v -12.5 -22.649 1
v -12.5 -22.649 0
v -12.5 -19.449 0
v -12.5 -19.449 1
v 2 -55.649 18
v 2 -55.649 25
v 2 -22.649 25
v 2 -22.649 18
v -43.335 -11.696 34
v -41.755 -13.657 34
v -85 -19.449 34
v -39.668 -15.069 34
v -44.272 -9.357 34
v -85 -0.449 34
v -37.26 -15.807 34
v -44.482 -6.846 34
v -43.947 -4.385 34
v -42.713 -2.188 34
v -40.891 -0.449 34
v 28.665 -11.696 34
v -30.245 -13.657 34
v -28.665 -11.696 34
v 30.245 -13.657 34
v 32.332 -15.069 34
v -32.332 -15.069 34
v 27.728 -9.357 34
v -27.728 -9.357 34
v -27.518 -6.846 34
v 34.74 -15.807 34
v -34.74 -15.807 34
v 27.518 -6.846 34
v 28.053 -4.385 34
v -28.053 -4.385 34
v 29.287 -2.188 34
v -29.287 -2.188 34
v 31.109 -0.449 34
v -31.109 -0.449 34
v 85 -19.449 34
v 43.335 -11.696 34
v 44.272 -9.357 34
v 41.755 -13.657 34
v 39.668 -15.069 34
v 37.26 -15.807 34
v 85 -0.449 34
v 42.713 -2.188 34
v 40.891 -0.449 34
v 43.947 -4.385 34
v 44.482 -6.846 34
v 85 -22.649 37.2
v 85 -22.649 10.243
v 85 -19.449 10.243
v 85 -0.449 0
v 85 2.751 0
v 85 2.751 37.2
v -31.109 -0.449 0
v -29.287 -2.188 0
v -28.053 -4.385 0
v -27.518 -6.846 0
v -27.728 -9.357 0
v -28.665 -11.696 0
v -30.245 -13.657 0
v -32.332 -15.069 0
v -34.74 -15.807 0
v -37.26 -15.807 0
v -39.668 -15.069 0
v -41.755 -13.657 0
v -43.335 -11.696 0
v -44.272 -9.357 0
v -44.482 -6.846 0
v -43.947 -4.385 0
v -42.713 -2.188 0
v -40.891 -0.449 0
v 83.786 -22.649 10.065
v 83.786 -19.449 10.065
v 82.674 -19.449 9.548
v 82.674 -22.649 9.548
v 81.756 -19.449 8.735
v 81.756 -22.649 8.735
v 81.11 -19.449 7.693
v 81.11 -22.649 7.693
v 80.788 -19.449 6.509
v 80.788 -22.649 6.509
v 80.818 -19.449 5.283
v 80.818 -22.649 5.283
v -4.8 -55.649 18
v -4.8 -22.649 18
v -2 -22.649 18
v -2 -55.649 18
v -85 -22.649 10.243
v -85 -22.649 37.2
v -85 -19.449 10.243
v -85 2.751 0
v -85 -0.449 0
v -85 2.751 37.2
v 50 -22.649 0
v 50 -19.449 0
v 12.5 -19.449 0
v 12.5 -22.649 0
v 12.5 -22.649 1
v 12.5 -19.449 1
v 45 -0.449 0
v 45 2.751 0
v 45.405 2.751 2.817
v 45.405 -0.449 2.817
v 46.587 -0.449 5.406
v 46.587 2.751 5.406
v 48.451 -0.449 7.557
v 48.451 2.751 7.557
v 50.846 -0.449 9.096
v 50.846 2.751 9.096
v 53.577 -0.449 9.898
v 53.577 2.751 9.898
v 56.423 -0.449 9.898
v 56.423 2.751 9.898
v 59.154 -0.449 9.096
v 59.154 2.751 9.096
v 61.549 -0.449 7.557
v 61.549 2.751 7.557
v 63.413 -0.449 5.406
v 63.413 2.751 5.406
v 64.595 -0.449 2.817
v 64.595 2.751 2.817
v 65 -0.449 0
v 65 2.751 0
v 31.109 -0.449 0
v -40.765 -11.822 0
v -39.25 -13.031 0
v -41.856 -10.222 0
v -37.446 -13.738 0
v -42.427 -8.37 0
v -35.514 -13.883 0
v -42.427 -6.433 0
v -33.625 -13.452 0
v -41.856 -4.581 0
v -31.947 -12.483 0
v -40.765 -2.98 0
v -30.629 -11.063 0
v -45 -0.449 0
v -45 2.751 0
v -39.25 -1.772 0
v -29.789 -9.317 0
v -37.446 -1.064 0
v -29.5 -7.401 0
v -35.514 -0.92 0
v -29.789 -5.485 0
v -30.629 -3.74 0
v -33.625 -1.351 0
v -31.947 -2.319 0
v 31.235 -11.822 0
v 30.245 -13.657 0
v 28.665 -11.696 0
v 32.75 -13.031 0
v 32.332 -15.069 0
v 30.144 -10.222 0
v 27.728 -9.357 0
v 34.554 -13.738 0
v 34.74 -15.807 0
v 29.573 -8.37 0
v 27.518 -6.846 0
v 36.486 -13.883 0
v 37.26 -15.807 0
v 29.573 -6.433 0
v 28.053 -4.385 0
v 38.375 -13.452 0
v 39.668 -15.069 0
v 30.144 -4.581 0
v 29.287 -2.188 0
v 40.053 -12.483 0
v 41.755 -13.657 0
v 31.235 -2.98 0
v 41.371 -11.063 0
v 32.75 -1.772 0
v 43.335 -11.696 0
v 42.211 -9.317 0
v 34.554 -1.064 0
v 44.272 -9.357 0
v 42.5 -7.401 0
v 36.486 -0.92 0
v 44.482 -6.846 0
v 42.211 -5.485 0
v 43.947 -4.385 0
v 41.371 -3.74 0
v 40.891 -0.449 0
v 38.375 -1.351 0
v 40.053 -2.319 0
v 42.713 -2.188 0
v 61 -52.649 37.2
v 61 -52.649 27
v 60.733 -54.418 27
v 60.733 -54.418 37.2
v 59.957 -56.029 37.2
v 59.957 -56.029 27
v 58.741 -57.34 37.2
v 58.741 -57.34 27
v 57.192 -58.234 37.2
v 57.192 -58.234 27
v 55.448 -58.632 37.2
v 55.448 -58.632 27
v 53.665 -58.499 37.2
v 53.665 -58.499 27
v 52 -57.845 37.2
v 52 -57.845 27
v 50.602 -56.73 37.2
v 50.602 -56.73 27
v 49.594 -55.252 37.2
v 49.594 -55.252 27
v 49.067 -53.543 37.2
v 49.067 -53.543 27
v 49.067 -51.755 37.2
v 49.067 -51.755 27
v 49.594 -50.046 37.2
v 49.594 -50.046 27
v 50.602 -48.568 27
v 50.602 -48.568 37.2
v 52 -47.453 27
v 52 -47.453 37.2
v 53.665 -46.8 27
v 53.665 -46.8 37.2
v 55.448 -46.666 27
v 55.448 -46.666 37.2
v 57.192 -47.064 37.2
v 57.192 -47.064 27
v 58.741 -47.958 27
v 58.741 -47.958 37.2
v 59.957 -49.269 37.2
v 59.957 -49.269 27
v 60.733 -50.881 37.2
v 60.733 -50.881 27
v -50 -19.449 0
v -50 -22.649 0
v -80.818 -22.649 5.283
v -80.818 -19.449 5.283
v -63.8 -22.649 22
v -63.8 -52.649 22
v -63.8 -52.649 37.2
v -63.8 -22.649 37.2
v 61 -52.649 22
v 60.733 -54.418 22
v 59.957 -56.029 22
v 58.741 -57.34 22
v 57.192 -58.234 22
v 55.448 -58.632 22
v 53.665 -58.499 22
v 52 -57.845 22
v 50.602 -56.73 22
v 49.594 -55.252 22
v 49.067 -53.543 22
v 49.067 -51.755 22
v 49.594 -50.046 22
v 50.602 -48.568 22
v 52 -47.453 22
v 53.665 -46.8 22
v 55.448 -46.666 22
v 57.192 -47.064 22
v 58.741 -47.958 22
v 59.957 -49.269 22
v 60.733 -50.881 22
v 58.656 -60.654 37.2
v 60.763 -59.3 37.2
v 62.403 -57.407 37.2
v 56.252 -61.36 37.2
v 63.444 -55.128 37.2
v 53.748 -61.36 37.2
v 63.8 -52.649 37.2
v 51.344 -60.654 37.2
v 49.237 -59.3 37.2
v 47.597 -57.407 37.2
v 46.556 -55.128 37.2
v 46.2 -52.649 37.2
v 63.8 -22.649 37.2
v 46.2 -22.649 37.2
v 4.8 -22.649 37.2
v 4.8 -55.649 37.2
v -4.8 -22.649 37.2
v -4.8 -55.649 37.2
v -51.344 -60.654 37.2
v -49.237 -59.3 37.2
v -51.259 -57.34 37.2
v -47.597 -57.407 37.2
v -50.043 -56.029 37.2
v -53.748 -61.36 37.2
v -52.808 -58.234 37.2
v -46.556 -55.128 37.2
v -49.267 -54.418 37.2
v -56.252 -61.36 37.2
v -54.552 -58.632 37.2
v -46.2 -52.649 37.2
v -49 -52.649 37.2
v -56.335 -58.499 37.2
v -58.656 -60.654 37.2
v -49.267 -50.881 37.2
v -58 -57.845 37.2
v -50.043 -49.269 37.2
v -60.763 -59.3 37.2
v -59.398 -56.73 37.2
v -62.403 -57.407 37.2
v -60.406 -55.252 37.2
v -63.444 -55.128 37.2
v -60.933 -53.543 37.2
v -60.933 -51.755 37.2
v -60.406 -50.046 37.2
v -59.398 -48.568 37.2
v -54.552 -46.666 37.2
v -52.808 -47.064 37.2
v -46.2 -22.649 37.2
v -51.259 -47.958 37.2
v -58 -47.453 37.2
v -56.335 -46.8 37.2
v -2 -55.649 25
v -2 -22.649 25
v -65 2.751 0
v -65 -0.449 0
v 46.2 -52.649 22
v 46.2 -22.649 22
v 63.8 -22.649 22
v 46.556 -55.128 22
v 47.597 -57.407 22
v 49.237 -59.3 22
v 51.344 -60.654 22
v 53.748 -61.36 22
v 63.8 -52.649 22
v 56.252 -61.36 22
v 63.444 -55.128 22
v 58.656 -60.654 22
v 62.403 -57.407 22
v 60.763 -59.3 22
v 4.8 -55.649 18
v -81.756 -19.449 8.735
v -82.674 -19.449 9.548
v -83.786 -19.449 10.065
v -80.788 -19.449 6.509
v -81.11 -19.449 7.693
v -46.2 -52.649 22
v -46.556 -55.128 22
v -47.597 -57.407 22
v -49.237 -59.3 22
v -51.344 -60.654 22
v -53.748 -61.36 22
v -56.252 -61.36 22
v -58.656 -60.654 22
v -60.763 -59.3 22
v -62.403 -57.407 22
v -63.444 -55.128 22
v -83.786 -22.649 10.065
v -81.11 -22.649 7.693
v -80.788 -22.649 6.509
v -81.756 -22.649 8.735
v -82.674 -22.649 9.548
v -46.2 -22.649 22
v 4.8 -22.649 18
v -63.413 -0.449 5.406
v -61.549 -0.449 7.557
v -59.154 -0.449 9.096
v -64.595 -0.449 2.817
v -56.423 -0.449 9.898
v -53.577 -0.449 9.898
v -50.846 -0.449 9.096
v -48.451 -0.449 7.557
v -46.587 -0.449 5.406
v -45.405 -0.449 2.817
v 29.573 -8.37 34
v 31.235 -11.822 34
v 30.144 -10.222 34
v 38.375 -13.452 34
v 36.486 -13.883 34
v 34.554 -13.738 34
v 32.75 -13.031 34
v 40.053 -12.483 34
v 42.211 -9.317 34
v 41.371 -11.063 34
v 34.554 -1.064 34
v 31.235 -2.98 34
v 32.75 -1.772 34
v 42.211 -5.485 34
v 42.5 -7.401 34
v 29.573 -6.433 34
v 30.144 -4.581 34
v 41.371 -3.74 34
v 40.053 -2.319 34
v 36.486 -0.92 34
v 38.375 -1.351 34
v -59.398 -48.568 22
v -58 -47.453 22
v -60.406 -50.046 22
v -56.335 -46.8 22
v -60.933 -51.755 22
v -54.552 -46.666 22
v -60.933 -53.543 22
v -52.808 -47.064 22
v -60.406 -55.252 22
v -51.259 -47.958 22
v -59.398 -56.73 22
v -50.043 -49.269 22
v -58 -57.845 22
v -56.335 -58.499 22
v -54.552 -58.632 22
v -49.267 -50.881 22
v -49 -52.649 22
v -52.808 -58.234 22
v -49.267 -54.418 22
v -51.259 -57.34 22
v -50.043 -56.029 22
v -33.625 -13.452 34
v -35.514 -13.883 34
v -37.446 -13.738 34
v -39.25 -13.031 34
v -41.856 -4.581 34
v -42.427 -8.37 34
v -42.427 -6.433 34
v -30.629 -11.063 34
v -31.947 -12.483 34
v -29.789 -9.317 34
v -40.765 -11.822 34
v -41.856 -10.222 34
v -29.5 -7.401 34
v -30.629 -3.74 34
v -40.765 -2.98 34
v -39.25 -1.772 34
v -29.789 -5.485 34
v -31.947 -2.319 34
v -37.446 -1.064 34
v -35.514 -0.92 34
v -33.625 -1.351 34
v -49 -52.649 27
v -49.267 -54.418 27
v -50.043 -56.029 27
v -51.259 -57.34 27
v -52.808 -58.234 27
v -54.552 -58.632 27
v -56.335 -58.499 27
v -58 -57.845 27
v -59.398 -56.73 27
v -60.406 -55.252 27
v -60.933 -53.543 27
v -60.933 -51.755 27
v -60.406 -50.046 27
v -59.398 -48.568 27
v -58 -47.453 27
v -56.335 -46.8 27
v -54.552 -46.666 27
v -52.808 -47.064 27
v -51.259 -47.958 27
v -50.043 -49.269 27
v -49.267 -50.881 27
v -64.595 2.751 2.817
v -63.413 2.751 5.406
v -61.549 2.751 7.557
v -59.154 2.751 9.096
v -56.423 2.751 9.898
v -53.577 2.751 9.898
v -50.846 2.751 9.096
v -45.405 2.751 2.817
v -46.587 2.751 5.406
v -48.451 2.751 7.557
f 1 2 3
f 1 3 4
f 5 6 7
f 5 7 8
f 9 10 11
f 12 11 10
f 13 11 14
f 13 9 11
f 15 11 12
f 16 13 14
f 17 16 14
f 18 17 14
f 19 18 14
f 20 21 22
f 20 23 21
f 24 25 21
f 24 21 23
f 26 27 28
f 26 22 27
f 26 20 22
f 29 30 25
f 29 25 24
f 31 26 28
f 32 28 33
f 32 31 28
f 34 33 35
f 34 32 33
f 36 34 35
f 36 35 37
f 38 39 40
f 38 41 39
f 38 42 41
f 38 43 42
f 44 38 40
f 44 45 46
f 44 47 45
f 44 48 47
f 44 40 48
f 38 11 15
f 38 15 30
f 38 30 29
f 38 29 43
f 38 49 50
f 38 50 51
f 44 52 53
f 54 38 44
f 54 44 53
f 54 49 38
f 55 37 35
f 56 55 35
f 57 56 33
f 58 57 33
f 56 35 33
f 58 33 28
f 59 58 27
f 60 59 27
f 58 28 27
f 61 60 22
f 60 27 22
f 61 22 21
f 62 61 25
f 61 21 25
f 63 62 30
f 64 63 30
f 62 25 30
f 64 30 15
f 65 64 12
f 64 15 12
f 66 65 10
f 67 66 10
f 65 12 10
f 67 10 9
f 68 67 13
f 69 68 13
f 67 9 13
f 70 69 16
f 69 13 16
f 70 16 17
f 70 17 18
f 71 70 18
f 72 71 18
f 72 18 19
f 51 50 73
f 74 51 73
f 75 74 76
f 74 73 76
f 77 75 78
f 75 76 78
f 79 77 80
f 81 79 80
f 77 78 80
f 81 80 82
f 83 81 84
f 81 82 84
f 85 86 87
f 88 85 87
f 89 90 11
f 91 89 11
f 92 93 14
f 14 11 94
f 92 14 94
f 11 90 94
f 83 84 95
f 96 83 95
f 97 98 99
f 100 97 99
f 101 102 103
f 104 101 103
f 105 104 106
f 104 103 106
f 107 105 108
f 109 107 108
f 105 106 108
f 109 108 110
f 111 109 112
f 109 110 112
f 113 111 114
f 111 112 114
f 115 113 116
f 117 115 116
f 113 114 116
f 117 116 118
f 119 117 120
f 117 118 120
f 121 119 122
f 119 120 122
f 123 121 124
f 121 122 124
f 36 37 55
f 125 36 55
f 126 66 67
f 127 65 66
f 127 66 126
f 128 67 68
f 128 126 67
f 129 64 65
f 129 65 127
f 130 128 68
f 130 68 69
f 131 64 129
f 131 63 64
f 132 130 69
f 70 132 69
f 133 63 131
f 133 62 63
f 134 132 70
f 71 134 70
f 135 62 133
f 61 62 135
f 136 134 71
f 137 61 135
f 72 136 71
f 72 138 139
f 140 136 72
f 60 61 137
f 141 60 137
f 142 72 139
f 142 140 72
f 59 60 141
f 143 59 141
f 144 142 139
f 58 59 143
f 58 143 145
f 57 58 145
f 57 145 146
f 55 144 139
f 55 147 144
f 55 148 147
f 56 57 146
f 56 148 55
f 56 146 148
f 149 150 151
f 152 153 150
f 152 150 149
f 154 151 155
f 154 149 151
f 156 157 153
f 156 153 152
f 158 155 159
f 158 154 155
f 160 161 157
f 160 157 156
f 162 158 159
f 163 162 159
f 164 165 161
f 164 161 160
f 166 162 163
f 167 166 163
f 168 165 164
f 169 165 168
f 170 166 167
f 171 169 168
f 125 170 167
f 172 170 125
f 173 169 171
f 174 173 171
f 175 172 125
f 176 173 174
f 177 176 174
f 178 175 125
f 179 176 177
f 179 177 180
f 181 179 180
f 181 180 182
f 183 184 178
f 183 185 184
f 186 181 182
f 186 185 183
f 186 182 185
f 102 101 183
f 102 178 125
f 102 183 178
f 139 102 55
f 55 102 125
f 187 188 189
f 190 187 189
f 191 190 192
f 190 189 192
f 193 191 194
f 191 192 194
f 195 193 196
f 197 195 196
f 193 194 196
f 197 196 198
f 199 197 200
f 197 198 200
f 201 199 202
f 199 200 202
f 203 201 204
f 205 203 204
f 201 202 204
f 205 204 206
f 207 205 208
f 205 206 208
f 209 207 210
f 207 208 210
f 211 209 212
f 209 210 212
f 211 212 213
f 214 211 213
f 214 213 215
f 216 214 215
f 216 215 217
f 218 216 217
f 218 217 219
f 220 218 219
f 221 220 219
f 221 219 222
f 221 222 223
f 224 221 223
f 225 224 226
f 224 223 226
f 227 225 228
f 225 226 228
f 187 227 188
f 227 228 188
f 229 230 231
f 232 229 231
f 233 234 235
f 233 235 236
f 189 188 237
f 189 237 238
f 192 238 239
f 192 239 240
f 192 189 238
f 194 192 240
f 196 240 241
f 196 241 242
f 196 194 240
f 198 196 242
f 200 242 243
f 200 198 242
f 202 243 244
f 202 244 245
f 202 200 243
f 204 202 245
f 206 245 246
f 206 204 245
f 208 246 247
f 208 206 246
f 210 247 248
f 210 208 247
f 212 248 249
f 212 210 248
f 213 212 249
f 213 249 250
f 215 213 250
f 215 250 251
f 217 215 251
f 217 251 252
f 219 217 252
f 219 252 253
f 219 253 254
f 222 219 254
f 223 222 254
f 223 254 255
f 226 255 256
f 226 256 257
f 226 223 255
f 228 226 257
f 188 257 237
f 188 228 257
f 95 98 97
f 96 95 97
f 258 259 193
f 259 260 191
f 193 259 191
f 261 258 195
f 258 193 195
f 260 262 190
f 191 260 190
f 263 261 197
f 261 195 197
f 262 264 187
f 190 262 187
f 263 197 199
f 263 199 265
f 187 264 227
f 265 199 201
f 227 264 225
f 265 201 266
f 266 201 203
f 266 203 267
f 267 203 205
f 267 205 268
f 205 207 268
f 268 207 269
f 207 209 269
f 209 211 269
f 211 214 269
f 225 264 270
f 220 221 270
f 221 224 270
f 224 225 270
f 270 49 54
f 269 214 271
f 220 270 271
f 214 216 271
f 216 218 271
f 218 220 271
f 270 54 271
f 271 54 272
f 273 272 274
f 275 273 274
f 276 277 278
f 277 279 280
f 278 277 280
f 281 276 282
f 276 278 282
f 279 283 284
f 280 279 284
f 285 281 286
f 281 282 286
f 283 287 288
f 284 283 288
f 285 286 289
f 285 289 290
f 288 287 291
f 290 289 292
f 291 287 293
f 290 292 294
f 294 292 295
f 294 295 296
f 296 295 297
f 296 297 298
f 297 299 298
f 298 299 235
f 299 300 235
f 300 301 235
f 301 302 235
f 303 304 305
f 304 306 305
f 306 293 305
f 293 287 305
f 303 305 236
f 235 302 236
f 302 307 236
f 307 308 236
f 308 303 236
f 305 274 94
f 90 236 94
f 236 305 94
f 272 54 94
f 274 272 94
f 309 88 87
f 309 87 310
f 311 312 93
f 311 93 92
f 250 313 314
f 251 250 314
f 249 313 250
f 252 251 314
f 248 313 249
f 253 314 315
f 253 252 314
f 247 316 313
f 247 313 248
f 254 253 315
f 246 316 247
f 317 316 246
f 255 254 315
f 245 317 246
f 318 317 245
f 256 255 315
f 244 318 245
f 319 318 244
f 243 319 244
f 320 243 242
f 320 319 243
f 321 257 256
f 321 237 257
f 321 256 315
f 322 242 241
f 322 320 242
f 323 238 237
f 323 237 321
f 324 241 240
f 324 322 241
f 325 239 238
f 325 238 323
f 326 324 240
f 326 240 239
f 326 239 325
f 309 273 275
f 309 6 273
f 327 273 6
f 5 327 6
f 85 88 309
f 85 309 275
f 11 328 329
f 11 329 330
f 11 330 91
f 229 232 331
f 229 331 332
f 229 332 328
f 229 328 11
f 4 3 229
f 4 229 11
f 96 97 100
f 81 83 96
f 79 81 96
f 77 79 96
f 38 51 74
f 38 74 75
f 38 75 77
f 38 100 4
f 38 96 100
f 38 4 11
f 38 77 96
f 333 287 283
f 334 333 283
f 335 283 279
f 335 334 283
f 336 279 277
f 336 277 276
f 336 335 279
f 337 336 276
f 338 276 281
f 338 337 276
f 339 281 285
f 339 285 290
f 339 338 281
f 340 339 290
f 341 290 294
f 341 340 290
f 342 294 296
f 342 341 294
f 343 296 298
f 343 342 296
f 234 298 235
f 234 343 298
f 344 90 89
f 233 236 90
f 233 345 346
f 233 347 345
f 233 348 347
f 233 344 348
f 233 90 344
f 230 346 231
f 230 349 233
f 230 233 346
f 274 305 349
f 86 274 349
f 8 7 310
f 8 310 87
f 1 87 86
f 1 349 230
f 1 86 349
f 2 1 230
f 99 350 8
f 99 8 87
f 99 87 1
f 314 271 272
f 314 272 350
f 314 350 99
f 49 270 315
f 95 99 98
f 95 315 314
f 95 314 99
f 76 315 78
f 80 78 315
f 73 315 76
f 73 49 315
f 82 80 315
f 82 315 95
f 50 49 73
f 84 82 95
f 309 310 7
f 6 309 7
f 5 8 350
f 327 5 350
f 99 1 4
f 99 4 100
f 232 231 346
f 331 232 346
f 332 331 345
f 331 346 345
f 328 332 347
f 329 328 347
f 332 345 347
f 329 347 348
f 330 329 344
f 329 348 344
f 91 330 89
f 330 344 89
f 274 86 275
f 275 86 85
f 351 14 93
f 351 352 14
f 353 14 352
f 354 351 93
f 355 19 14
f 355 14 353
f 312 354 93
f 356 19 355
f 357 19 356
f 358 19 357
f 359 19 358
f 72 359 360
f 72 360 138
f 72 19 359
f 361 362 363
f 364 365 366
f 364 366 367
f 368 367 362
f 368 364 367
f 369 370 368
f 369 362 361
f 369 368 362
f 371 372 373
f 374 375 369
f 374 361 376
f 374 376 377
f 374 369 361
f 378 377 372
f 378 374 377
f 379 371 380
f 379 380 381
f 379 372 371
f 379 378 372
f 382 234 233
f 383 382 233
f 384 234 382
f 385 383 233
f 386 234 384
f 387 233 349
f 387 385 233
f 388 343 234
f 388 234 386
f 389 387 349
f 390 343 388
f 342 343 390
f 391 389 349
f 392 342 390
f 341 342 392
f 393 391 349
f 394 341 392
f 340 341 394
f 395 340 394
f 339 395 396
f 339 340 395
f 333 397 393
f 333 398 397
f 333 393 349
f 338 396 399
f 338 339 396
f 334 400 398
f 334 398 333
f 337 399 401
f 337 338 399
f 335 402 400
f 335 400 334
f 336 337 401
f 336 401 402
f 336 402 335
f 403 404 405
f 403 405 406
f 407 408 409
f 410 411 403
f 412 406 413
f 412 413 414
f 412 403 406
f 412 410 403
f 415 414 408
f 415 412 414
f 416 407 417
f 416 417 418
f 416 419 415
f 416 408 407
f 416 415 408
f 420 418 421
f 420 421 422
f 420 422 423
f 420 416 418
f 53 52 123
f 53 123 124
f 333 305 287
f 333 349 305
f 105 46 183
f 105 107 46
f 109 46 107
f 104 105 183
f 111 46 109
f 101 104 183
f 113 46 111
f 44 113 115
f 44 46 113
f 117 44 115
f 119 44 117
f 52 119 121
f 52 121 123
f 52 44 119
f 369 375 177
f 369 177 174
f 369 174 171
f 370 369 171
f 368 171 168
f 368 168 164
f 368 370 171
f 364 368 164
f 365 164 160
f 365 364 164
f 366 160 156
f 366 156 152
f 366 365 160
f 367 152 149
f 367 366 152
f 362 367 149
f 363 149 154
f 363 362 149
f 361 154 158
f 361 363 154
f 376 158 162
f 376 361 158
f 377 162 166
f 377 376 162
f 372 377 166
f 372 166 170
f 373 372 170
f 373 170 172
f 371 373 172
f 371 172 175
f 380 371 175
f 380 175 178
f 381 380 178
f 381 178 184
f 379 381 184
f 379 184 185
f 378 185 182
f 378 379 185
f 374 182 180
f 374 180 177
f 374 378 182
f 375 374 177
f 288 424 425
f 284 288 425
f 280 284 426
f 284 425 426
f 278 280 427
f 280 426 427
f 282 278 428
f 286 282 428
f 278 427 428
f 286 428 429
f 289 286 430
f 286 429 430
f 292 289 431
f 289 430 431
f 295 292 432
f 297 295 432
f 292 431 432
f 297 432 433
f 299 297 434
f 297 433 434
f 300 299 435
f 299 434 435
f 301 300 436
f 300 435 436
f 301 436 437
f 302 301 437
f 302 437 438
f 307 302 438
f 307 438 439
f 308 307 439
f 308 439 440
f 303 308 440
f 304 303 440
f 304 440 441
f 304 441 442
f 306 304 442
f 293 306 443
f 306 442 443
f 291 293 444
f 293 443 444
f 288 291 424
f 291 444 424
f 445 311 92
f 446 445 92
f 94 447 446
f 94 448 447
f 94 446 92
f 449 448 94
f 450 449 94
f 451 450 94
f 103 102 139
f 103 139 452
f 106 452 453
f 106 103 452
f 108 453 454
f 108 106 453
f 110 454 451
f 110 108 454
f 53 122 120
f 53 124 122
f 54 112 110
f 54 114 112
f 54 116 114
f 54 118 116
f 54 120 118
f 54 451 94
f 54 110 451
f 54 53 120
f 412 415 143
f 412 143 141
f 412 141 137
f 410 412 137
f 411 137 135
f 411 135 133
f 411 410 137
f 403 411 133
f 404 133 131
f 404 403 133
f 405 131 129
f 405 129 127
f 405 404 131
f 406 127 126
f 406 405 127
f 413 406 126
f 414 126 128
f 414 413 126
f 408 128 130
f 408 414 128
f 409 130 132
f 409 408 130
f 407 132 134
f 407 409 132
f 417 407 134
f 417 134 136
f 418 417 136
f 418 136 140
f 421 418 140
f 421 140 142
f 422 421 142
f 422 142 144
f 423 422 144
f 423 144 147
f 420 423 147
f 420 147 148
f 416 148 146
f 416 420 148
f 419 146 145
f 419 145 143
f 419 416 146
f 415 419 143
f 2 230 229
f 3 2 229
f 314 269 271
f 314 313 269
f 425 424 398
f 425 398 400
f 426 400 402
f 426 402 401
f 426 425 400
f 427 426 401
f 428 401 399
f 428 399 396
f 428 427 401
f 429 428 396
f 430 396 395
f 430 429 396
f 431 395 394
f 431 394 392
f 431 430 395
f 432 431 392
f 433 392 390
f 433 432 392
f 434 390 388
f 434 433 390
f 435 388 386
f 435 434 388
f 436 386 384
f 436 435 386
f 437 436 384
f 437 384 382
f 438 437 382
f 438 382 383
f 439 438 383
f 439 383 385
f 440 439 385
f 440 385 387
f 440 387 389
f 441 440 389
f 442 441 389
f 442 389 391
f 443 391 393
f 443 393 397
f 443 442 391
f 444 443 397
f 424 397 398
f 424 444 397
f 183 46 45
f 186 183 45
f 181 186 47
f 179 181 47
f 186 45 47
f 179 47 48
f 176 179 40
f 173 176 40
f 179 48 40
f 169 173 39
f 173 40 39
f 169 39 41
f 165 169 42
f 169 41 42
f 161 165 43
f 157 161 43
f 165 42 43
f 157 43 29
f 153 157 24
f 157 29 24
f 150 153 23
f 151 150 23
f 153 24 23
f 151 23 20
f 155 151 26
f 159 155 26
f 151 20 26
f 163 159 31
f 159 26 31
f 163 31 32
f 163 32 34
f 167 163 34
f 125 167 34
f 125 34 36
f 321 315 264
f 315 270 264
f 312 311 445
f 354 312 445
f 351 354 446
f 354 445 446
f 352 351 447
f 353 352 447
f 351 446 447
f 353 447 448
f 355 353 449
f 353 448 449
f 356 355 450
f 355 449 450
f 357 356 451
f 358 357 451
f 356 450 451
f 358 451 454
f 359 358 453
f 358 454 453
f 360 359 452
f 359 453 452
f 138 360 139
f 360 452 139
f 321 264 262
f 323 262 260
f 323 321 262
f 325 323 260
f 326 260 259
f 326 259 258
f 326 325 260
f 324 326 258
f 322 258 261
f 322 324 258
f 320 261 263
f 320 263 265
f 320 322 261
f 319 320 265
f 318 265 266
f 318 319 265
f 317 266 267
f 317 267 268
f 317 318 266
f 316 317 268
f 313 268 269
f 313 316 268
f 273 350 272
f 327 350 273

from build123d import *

# Parameters (mm, degrees)
F1_DEPTH       = 85
F3_DEPTH       = 3.2
F4_W           = 25
F4_H           = 1
F5_DEPTH       = 3.2
F6_R           = 6.5
F7_DEPTH       = 34
F9_DEPTH       = 33
F11_R          = 6
F12_DEPTH      = 5
F12_DEPTH_BACK = 10.2
F13_DEPTH      = 9.4


with BuildPart() as f1:
    # F0 (on Right) → F1 (new body, symmetric)
    with BuildSketch(Plane.YZ):
        Polygon((2.7508442084, 0), (2.7508442084, 37.2), (-22.6491557916, 37.2), (-22.6491557916, 0), (-19.4491557916, 0), (-19.4491557916, 34), (-0.4491557916, 34), (-0.4491557916, 0), align=None)
    extrude(amount=F1_DEPTH, both=True)

    # F2 (on face) → F3 (cut, through all)
    with BuildSketch(Plane(origin=(0, 2.7508442084, 0), x_dir=(-1, 0, 0), z_dir=(0, 1, 0))):
        with BuildLine():
            Line((-65, 0), (-45, 0))
            ThreePointArc((-45, 0), (-55, 10), (-65, 0))
        make_face()
        with BuildLine():
            ThreePointArc((65, 0), (55, 10), (45, 0))
            Line((45, 0), (65, 0))
        make_face()
    extrude(amount=-F3_DEPTH, mode=Mode.SUBTRACT)

    # F4 (on face) → F5 (cut, through all)
    with BuildSketch(Plane.XZ.offset(22.6491557916)):
        Polygon((-80.8183589196, 5.2831472434), (-85, 6), (-85, 0), (-50, 0), align=None)
        Polygon((80.8183589196, 5.2831472434), (50, 0), (85, 0), (85, 6), align=None)
        with Locations((0, 0.5)):
            Rectangle(F4_W, F4_H)
        with BuildLine():
            Line((-85, 10.2426406871), (-85, 6))
            Line((-85, 6), (-80.8183589196, 5.2831472434))
            ThreePointArc((-80.8183589196, 5.2831472434), (-81.7564411003, 8.7348355826), (-85, 10.2426406871))
        make_face()
        with BuildLine():
            Line((85, 6), (85, 10.2426406871))
            ThreePointArc((85, 10.2426406871), (81.7564411003, 8.7348355826), (80.8183589196, 5.2831472434))
            Line((80.8183589196, 5.2831472434), (85, 6))
        make_face()
    extrude(amount=-F5_DEPTH, mode=Mode.SUBTRACT)

    # F6 (on face) → F7 (join, through all)
    with BuildSketch(Plane(origin=(0, 0, 34), x_dir=(1, 0, 0), z_dir=(0, 0, -1))):
        with BuildLine():
            ThreePointArc((40.8905171703, 0.4491557916), (36, 15.9013383128), (31.1094828297, 0.4491557916))
            Line((31.1094828297, 0.4491557916), (40.8905171703, 0.4491557916))
        make_face()
        with Locations((36, 7.4013383128)):
            Circle(F6_R, mode=Mode.SUBTRACT)
        with BuildLine():
            Line((-40.8905171703, 0.4491557916), (-31.1094828297, 0.4491557916))
            ThreePointArc((-31.1094828297, 0.4491557916), (-36, 15.9013383128), (-40.8905171703, 0.4491557916))
        make_face()
        with Locations((-36, 7.4013383128)):
            Circle(F6_R, mode=Mode.SUBTRACT)
    extrude(amount=F7_DEPTH)

    # F8 (on face) → F9 (join)
    with BuildSketch(Plane.XZ.offset(22.6491557916)):
        Polygon((-2, 18), (-2, 25), (2, 25), (2, 18), (4.8, 18), (4.8, 27.8), (-4.8, 27.8), (-4.8, 18), align=None)
    extrude(amount=F9_DEPTH)

    # F11 (on offset) → F12 (join, two sides)
    with BuildSketch(Plane(origin=(0, 0, 27), x_dir=(1, 0, 0), z_dir=(0, 0, -1))) as f12_sk:
        with BuildLine():
            Line((-46.2, 22.6491557916), (-46.2, 52.6491557916))
            ThreePointArc((-46.2, 52.6491557916), (-55, 43.8491557916), (-63.8, 52.6491557916))
            Line((-63.8, 52.6491557916), (-63.8, 22.6491557916))
            Line((-63.8, 22.6491557916), (-46.2, 22.6491557916))
        make_face()
        with BuildLine():
            ThreePointArc((-63.8, 52.6491557916), (-55, 43.8491557916), (-46.2, 52.6491557916))
            ThreePointArc((-46.2, 52.6491557916), (-55, 61.4491557916), (-63.8, 52.6491557916))
        make_face()
        with Locations((-55, 52.6491557916)):
            Circle(F11_R, mode=Mode.SUBTRACT)
        with BuildLine():
            Line((63.8, 22.6491557916), (63.8, 52.6491557916))
            ThreePointArc((63.8, 52.6491557916), (55, 43.8491557916), (46.2, 52.6491557916))
            Line((46.2, 52.6491557916), (46.2, 22.6491557916))
            Line((46.2, 22.6491557916), (63.8, 22.6491557916))
        make_face()
        with BuildLine():
            ThreePointArc((46.2, 52.6491557916), (55, 43.8491557916), (63.8, 52.6491557916))
            ThreePointArc((63.8, 52.6491557916), (55, 61.4491557916), (46.2, 52.6491557916))
        make_face()
        with Locations((55, 52.6491557916)):
            Circle(F11_R, mode=Mode.SUBTRACT)
    extrude(amount=F12_DEPTH)
    extrude(f12_sk.sketch, amount=-F12_DEPTH_BACK)

    # F13 (add, through all): a face of the model
    f13_faces = [f1.faces().sort_by_distance(p)[0] for p in [
        (0, -39.1491557916, 27.8),
    ]]
    extrude(f13_faces, amount=F13_DEPTH)


solid = f1.part
